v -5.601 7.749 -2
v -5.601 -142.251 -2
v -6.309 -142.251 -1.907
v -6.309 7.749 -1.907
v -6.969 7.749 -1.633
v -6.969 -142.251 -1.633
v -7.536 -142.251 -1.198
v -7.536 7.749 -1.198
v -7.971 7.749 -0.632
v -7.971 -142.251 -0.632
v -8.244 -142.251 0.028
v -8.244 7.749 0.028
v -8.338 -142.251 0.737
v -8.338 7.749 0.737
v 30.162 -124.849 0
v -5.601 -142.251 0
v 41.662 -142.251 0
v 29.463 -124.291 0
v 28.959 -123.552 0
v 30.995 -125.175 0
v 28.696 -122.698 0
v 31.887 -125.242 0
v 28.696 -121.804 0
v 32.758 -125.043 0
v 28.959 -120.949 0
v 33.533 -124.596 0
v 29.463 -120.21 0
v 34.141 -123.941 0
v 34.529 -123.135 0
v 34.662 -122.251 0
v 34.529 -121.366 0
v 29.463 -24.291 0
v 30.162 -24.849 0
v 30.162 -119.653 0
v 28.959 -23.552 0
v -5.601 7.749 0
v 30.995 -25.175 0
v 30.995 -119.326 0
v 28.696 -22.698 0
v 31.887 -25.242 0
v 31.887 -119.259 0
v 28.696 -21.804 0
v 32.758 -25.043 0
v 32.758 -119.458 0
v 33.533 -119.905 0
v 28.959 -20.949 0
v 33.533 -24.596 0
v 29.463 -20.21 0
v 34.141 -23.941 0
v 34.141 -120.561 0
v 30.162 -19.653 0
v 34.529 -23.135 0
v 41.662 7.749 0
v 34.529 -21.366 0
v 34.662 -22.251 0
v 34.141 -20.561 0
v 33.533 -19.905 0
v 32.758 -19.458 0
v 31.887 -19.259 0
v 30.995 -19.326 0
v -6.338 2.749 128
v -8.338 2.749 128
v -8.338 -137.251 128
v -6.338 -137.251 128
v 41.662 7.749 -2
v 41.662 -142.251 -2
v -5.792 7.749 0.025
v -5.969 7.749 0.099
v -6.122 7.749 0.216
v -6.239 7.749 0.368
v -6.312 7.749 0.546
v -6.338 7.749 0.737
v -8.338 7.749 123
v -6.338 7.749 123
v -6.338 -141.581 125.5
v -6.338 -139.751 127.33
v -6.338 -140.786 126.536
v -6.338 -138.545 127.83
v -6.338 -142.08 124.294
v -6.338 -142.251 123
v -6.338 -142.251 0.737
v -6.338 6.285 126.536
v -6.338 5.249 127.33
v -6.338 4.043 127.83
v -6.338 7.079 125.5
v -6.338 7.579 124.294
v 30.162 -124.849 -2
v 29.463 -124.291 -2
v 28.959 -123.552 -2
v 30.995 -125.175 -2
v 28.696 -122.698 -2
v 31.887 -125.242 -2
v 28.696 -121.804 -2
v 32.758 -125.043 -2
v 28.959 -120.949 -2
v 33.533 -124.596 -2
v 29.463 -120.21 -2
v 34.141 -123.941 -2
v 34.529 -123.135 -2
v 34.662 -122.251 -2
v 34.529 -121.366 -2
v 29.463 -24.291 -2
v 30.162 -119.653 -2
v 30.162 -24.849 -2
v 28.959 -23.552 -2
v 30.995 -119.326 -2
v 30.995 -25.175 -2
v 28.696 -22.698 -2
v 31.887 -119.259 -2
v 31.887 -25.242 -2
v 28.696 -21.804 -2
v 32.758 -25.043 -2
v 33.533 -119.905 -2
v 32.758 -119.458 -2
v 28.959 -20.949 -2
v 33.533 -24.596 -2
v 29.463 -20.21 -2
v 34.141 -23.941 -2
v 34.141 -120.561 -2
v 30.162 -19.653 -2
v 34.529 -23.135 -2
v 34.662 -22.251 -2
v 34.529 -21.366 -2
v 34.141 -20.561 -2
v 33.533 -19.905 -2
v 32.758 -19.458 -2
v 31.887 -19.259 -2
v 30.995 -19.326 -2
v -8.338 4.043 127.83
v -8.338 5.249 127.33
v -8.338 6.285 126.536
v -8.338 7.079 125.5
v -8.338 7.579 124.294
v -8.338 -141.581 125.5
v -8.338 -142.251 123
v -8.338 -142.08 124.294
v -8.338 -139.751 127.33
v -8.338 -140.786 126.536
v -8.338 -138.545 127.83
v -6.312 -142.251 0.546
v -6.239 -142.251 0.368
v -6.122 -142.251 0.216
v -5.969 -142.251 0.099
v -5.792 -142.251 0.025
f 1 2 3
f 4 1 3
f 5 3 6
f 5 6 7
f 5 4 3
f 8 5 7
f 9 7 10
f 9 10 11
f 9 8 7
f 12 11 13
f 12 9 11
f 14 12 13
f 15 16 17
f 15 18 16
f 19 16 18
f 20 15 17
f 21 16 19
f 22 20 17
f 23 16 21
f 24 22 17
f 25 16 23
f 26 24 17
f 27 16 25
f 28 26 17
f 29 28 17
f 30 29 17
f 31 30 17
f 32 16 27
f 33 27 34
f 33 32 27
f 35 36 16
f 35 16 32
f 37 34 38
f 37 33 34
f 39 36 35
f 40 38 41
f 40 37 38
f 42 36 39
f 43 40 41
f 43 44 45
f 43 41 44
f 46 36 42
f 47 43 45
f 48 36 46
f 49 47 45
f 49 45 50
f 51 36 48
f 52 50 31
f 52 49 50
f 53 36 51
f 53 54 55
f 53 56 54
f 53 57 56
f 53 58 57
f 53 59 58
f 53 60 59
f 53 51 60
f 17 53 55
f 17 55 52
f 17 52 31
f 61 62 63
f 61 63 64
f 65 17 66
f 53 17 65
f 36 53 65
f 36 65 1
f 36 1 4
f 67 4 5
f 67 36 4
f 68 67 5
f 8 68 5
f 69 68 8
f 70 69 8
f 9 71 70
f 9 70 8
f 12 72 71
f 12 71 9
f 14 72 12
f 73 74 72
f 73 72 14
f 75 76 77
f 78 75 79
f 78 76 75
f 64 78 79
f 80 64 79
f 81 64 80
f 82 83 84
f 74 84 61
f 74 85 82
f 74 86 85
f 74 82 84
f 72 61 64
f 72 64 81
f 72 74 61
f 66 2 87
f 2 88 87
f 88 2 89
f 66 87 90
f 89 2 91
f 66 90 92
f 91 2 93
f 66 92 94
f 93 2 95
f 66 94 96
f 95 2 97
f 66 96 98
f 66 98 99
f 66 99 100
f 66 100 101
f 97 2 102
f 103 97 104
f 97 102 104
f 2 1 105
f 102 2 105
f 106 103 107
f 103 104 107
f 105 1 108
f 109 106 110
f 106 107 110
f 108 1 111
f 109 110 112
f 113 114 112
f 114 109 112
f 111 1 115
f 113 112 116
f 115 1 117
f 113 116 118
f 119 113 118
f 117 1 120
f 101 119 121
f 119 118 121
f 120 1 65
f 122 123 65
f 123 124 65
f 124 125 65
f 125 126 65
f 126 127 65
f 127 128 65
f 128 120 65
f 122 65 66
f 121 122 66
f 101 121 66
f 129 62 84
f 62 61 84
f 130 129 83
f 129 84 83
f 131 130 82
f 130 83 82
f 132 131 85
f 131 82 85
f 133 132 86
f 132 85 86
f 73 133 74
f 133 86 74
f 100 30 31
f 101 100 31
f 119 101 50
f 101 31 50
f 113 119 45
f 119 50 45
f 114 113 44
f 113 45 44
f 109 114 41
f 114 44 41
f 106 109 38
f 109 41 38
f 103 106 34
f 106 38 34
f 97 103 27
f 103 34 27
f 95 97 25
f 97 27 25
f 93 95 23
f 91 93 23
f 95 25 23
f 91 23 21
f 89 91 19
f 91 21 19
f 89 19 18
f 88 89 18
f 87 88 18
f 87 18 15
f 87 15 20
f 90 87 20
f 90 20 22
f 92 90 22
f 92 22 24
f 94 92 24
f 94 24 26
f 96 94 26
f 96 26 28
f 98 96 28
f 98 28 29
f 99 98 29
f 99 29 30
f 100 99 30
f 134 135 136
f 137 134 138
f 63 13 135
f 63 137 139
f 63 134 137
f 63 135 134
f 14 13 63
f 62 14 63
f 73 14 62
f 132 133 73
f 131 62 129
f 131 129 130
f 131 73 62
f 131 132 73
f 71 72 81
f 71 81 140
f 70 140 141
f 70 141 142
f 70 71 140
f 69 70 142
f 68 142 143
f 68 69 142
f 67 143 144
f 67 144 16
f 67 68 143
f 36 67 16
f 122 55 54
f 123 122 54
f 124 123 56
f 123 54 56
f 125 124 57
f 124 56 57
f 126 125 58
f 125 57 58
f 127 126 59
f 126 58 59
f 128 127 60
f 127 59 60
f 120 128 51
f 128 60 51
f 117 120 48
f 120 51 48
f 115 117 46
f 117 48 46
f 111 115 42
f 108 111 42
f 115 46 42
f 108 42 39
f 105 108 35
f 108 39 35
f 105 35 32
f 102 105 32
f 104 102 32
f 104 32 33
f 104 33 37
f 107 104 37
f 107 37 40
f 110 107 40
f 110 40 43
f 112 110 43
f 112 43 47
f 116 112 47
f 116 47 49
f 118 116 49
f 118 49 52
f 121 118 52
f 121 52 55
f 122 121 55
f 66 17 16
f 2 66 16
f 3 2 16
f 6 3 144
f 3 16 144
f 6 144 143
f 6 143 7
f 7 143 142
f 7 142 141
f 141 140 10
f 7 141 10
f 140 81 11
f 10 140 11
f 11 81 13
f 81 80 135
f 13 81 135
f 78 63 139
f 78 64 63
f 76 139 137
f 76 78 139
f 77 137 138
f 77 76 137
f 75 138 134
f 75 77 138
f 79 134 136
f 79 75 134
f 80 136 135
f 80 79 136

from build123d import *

# Parameters (mm, degrees)
SKETCH_1_W                       = 50
SKETCH_1_H                       = 150
SM_BASE_FLANGE_1_DEPTH           = 2
SM_EDGE_FLANGE_1_STRIP_W         = 9.4732
SM_EDGE_FLANGE_1_STRIP_H         = 2
SM_EDGE_FLANGE_1_STRIP_CUT_DEPTH = 150
SM_EDGE_FLANGE_1_DEPTH           = 150
SKETCH_8_R                       = 3
CUT_EXTRUDE_1_DEPTH              = 10
PATTERN_LINEAR_1_COUNT           = 2
PATTERN_LINEAR_1_PITCH           = 100
FILLET_2_R                       = 5
FILLET_3_R                       = 5


# Sheet-metal steps are written as plain solids
with BuildPart() as part:
    # Sketch 1 → 基体-法兰1 (new body)
    with BuildSketch(Plane.XY):
        with Locations((16.662404092, -67.250639386)):
            Rectangle(SKETCH_1_W, SKETCH_1_H)
    extrude(amount=-SM_BASE_FLANGE_1_DEPTH)

    # 边线-法兰1 strip (across the edge) → 边线-法兰1 strip cut (cut)
    with BuildSketch(Plane(origin=(-8.337595908, 7.749360614, 0), x_dir=(1, 0, 0), z_dir=(0, -1, 0))):
        with Locations((-2, -1)):
            Rectangle(SM_EDGE_FLANGE_1_STRIP_W, SM_EDGE_FLANGE_1_STRIP_H)
    extrude(amount=SM_EDGE_FLANGE_1_STRIP_CUT_DEPTH, mode=Mode.SUBTRACT)

    # 边线-法兰1 section (across the edge) → 边线-法兰1 (add)
    with BuildSketch(Plane(origin=(-8.337595908, 7.749360614, 0), x_dir=(1, 0, 0), z_dir=(0, -1, 0))):
        with BuildLine():
            Line((0, 0.7366), (0, 128))
            Line((0, 128), (2, 128))
            Line((2, 128), (2, 0.7366))
            ThreePointArc((2, 0.7366), (2.215745145, 0.215745145), (2.7366, 0))
            Line((2.7366, 0), (2.7366, -2))
            ThreePointArc((2.7366, -2), (0.801531583, -1.198468417), (0, 0.7366))
        make_face()
    extrude(amount=SM_EDGE_FLANGE_1_DEPTH)

    # 草图8 → 切除-拉伸1 (cut)
    with BuildSketch(Plane.XY):
        with Locations((31.662404092, -22.250639386)):
            Circle(SKETCH_8_R)
    cut_extrude_1 = extrude(amount=-CUT_EXTRUDE_1_DEPTH, mode=Mode.SUBTRACT)

    # 阵列(线性)1: 切除-拉伸1 ×2
    with Locations(*[(0, -i * PATTERN_LINEAR_1_PITCH, 0) for i in range(1, PATTERN_LINEAR_1_COUNT)]):
        add(cut_extrude_1, mode=Mode.SUBTRACT)

    # 圆角2
    fillet_2_edges = [part.edges().sort_by_distance(p)[0] for p in [
        (-7.337595908, 7.749360614, 128),
    ]]
    fillet(fillet_2_edges, radius=FILLET_2_R)

    # 圆角3
    fillet_3_edges = [part.edges().sort_by_distance(p)[0] for p in [
        (-7.337595908, -142.250639386, 128),
    ]]
    fillet(fillet_3_edges, radius=FILLET_3_R)


solid = part.part
